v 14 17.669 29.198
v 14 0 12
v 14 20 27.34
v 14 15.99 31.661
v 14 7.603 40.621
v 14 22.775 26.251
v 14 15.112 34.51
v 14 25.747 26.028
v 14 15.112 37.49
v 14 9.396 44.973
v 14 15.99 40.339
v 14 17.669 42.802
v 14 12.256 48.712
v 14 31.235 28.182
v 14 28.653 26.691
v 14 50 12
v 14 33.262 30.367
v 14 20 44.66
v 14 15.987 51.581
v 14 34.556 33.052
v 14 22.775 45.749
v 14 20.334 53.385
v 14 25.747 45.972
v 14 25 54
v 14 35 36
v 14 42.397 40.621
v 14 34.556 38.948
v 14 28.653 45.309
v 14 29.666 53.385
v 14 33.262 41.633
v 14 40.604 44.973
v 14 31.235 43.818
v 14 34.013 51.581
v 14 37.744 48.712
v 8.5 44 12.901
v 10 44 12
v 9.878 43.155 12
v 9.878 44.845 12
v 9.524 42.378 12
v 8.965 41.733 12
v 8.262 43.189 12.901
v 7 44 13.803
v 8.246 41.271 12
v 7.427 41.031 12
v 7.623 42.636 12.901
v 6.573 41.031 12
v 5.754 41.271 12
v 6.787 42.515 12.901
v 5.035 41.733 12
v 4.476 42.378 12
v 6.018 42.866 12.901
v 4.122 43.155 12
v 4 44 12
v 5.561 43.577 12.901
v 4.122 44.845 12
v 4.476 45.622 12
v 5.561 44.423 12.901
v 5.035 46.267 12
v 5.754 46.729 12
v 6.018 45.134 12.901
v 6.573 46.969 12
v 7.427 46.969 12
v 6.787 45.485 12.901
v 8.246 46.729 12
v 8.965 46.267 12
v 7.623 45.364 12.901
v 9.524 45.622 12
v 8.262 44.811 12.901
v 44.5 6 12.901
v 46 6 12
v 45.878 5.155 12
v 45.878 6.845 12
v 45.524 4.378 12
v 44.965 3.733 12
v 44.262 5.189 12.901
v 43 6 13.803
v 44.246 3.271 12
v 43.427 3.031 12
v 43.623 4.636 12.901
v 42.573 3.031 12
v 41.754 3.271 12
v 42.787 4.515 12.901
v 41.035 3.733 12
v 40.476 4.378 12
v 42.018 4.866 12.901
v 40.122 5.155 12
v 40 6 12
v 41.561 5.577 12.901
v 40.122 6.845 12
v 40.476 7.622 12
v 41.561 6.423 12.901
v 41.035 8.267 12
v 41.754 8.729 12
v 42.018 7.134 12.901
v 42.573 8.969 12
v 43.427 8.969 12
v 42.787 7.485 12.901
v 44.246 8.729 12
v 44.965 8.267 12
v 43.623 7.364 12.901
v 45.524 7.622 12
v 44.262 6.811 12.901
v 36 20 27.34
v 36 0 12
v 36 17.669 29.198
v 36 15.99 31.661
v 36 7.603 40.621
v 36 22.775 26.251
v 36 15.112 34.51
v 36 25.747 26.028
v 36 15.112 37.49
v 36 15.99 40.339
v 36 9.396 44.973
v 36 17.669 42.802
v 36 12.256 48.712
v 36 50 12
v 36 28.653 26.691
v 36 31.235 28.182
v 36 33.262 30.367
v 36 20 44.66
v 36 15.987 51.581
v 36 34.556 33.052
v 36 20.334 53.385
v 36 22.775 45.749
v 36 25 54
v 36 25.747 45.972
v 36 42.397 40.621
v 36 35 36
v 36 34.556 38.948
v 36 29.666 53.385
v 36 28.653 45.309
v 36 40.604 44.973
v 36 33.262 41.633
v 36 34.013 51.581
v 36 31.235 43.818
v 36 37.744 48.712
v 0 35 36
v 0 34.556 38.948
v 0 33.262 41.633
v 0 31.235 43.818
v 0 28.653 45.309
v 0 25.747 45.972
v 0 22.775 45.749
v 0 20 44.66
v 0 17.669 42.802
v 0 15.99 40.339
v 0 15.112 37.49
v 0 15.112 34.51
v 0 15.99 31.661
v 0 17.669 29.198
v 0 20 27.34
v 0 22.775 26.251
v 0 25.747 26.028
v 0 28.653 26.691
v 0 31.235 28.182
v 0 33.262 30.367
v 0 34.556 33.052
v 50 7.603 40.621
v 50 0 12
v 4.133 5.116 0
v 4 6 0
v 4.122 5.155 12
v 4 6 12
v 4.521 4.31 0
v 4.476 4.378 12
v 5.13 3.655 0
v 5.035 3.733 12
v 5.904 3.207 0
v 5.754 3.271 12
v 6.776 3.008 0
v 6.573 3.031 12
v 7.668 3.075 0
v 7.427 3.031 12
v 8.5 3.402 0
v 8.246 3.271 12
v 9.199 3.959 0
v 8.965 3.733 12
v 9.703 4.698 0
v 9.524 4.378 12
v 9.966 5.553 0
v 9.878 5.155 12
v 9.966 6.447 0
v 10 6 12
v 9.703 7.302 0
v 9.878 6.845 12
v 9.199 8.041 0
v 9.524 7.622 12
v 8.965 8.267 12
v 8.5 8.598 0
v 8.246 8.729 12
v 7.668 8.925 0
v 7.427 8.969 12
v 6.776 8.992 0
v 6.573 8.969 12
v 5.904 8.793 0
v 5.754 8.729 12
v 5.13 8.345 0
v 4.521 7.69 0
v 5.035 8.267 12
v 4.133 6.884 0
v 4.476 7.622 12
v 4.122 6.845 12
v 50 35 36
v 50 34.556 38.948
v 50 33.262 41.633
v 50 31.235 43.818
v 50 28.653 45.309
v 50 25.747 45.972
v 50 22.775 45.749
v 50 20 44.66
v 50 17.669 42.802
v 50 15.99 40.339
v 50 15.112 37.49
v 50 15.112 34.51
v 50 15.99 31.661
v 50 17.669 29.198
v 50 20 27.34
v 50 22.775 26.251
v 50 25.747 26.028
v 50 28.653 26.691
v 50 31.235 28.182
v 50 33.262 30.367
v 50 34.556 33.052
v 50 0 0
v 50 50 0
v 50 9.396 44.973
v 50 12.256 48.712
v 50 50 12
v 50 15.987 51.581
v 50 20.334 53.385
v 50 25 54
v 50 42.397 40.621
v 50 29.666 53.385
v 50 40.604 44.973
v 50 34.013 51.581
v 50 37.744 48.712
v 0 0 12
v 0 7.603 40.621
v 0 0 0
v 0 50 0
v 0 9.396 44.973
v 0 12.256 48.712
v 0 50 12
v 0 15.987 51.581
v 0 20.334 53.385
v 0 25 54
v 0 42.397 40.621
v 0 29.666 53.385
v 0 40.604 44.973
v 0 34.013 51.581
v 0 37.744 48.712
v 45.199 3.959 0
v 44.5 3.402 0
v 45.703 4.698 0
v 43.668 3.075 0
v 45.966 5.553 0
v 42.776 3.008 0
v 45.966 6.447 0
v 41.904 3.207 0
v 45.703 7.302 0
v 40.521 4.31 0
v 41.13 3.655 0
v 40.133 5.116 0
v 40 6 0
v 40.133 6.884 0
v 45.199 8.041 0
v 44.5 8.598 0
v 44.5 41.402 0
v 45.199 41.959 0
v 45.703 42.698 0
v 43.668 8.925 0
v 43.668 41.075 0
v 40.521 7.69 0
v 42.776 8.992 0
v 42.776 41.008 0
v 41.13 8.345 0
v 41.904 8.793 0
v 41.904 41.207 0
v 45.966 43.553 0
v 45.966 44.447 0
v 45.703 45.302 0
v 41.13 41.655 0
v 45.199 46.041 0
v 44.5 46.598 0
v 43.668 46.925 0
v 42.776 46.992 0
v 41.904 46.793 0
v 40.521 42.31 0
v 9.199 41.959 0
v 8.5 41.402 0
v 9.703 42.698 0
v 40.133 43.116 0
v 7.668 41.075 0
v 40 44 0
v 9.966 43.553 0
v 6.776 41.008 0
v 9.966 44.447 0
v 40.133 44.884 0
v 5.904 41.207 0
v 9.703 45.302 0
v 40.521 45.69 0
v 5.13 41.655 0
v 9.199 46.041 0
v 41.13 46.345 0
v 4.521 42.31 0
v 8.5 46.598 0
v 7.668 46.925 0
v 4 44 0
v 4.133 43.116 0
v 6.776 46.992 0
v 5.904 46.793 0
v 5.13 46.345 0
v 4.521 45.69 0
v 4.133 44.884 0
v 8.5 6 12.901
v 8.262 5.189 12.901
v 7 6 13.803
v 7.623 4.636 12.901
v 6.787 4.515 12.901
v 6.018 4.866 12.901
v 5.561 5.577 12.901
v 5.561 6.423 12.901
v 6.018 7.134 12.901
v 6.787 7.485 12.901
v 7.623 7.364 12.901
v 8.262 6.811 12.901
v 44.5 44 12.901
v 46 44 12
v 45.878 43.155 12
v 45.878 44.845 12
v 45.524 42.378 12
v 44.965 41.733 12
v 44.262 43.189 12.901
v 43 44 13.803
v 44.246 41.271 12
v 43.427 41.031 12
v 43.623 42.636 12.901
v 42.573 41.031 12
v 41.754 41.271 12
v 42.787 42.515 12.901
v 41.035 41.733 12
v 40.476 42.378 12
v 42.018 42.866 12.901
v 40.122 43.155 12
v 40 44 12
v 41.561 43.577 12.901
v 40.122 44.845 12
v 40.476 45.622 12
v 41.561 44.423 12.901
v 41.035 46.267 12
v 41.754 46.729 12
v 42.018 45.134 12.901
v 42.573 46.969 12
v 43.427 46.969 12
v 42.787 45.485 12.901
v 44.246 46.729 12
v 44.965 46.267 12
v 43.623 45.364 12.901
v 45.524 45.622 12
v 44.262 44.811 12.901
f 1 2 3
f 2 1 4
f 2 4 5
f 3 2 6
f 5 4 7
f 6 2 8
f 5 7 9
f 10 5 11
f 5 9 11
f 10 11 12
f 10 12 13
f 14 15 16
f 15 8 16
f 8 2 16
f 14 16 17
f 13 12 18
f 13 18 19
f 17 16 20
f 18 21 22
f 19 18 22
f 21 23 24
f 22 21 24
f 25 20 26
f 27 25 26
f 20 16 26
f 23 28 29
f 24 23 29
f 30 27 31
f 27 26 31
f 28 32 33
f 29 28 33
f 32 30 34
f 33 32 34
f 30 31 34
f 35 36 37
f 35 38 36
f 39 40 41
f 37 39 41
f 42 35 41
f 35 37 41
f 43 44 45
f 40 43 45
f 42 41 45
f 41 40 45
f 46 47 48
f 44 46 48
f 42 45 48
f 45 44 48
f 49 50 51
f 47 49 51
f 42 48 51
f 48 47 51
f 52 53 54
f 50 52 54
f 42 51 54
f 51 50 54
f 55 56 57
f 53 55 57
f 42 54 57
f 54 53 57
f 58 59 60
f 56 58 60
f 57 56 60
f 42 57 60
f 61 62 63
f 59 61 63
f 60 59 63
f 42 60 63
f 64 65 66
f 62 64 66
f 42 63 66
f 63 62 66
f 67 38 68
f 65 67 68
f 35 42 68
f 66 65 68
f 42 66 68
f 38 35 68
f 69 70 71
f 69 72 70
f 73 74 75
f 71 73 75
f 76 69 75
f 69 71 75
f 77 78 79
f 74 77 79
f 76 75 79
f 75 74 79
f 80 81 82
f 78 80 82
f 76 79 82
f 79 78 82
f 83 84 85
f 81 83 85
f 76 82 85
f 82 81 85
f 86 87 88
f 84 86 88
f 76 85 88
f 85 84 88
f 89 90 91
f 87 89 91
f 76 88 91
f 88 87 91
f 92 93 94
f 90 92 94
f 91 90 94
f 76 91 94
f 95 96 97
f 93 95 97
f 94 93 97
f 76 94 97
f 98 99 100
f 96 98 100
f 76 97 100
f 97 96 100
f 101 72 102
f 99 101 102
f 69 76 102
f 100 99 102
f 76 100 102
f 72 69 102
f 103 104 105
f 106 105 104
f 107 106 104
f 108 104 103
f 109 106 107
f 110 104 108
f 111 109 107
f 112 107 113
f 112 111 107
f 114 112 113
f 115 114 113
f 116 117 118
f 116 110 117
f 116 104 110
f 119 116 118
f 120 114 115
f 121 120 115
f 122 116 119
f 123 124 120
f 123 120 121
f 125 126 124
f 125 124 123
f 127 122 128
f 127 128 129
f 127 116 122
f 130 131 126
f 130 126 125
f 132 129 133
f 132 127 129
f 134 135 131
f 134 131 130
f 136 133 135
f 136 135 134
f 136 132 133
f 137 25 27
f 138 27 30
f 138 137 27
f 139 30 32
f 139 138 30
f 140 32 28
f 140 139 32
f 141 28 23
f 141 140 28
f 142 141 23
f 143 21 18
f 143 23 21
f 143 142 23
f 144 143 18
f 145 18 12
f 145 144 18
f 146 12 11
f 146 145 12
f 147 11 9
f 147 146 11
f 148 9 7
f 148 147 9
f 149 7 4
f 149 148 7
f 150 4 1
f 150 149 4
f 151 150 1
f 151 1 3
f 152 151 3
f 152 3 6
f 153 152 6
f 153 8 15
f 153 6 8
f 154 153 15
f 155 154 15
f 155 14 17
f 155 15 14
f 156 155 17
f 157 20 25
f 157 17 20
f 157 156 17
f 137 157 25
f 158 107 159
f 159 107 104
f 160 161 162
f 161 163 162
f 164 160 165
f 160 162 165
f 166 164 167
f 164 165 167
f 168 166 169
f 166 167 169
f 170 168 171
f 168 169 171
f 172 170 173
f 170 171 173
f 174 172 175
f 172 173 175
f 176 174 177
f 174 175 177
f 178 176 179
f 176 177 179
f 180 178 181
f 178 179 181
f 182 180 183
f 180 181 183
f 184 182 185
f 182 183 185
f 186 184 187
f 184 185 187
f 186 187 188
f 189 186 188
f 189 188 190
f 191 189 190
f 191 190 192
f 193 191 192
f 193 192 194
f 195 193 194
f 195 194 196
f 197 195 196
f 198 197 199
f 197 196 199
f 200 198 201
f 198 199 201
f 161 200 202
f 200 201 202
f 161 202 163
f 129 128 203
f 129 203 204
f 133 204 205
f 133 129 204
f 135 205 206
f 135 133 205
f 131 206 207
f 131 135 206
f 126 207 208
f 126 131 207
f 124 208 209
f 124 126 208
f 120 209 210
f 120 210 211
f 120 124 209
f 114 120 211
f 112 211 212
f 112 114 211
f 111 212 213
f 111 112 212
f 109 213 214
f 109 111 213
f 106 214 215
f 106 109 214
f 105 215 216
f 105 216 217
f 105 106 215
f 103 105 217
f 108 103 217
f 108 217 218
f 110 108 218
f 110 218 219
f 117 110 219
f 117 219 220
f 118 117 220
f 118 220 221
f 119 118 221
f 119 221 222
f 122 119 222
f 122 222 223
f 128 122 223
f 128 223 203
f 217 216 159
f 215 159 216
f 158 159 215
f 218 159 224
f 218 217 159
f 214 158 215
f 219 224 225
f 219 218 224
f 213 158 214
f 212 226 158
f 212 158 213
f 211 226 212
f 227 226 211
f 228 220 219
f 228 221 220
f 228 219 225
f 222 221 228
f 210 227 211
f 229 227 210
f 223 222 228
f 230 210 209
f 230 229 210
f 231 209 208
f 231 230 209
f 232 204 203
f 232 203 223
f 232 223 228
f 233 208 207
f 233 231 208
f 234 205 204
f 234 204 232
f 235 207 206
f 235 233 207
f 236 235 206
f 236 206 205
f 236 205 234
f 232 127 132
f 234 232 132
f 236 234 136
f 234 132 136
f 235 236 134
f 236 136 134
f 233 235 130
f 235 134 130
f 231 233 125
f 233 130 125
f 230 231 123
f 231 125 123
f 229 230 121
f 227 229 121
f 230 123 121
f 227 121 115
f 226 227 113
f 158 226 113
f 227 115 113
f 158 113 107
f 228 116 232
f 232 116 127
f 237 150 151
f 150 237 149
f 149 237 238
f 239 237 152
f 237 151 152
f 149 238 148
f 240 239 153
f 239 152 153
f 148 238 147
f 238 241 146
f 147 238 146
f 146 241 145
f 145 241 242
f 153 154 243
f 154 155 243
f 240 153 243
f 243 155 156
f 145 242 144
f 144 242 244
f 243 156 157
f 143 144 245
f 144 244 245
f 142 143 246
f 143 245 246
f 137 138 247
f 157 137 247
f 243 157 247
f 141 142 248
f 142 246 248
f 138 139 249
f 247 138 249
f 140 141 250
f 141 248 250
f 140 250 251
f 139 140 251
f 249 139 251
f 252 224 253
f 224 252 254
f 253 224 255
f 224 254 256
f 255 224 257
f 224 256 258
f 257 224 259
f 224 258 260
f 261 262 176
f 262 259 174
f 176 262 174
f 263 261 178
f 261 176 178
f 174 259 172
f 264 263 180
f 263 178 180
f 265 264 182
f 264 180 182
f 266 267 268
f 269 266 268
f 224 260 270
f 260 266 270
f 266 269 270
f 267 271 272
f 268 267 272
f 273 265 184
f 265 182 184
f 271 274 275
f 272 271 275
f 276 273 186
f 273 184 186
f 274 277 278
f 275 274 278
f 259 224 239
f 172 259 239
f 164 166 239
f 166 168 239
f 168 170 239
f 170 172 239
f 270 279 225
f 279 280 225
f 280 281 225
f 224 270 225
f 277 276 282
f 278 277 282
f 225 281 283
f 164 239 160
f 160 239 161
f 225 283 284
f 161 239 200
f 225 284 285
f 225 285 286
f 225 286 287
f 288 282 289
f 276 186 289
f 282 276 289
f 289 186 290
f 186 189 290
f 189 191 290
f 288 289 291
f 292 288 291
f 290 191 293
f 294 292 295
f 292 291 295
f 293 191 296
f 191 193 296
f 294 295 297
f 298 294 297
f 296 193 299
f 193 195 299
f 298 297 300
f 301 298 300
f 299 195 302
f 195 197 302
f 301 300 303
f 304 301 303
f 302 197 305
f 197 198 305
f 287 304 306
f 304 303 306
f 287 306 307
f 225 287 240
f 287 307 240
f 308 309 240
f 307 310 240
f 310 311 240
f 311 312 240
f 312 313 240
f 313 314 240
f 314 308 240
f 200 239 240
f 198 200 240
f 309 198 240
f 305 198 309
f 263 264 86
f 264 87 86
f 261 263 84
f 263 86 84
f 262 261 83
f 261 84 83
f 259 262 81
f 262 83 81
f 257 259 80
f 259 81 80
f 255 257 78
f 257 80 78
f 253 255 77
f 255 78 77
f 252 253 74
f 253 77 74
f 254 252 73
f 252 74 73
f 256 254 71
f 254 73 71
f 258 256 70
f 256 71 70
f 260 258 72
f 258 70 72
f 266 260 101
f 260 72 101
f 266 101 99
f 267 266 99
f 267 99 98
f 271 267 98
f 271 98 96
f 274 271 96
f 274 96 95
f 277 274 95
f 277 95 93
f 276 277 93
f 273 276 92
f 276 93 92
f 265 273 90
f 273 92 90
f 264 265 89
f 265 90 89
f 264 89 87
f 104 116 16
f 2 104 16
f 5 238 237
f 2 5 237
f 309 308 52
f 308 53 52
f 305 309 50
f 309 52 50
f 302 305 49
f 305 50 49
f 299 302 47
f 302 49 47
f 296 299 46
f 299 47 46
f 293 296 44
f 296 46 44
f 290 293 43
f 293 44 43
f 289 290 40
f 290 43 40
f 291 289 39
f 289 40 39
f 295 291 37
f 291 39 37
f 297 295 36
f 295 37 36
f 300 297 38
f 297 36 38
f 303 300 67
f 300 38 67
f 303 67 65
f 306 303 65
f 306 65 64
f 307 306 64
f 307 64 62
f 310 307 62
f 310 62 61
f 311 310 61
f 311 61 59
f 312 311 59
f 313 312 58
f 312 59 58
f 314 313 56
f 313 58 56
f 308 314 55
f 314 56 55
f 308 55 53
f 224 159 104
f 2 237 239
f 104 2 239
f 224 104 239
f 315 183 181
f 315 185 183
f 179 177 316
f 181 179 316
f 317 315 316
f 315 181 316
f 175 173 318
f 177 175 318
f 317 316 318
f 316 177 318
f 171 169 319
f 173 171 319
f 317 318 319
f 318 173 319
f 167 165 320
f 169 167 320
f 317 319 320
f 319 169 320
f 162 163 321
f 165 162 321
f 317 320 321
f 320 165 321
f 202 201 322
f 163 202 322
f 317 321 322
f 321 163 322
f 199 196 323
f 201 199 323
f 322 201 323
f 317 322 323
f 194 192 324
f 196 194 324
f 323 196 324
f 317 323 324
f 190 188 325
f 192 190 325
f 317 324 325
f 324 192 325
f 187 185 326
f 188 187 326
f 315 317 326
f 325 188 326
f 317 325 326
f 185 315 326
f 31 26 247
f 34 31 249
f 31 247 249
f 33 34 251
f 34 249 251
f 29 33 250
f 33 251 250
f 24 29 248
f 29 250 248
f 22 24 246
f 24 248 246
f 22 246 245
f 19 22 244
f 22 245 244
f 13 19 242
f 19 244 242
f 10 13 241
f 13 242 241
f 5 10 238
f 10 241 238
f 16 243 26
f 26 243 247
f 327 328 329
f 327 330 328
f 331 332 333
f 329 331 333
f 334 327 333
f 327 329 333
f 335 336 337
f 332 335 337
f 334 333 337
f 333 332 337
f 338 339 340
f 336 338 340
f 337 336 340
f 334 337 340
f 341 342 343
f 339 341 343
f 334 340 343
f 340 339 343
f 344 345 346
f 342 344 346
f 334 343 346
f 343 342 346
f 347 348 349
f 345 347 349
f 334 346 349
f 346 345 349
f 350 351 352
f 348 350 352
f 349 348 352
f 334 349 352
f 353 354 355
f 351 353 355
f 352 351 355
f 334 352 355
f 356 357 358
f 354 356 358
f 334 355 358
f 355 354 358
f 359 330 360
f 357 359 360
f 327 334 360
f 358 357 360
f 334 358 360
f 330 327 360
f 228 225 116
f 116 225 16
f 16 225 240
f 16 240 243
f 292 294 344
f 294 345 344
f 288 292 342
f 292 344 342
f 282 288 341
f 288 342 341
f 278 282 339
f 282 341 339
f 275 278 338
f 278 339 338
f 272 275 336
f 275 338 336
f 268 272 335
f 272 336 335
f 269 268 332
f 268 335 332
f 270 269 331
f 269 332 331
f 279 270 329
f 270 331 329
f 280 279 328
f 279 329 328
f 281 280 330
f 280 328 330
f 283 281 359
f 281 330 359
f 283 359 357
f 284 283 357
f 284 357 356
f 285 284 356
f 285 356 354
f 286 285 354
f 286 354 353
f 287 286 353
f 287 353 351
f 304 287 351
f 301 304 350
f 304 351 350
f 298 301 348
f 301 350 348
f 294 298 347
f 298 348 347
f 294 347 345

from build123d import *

# Parameters (mm, degrees)
F0_R     = 10
F1_DEPTH = 50
F2_W     = 22
F2_H     = 51.6468636014
F3_DEPTH = 61.9
F5_D     = 6
F5_DEPTH = 12
F5_TIP   = 1.8025818571


with BuildPart() as f1:
    # F0 (on Right) → F1 (new body)
    with BuildSketch(Plane.YZ):
        with BuildLine():
            Line((0, 12), (0, 0))
            Line((0, 0), (50, 0))
            Line((50, 0), (50, 12))
            Line((50, 12), (42.3966097096, 40.6214684475))
            ThreePointArc((42.3966097096, 40.6214684475), (25, 54), (7.6033902904, 40.6214684475))
            Line((7.6033902904, 40.6214684475), (0, 12))
        make_face()
        with Locations((25, 36)):
            Circle(F0_R, mode=Mode.SUBTRACT)
    extrude(amount=F1_DEPTH)

    # F2 (on face) → F3 (cut)
    with BuildSketch(Plane(origin=(0, 50, 0), x_dir=(-1, 0, 0), z_dir=(0, 1, 0))):
        with Locations((-25, 37.8234318007)):
            Rectangle(F2_W, F2_H)
    extrude(amount=-F3_DEPTH, mode=Mode.SUBTRACT)

    # F5
    with Locations(Plane(origin=(0, 0, 0), x_dir=(1, 0, 0), z_dir=(0, 0, -1))):
        with Locations((7, -6), (7, -44), (43, -44), (43, -6)):
            Hole(F5_D / 2, depth=F5_DEPTH)
            with Locations((0, 0, -(F5_DEPTH + F5_TIP / 2))):  # 118° drill point
                Cone(0, F5_D / 2, F5_TIP, mode=Mode.SUBTRACT)


solid = f1.part
